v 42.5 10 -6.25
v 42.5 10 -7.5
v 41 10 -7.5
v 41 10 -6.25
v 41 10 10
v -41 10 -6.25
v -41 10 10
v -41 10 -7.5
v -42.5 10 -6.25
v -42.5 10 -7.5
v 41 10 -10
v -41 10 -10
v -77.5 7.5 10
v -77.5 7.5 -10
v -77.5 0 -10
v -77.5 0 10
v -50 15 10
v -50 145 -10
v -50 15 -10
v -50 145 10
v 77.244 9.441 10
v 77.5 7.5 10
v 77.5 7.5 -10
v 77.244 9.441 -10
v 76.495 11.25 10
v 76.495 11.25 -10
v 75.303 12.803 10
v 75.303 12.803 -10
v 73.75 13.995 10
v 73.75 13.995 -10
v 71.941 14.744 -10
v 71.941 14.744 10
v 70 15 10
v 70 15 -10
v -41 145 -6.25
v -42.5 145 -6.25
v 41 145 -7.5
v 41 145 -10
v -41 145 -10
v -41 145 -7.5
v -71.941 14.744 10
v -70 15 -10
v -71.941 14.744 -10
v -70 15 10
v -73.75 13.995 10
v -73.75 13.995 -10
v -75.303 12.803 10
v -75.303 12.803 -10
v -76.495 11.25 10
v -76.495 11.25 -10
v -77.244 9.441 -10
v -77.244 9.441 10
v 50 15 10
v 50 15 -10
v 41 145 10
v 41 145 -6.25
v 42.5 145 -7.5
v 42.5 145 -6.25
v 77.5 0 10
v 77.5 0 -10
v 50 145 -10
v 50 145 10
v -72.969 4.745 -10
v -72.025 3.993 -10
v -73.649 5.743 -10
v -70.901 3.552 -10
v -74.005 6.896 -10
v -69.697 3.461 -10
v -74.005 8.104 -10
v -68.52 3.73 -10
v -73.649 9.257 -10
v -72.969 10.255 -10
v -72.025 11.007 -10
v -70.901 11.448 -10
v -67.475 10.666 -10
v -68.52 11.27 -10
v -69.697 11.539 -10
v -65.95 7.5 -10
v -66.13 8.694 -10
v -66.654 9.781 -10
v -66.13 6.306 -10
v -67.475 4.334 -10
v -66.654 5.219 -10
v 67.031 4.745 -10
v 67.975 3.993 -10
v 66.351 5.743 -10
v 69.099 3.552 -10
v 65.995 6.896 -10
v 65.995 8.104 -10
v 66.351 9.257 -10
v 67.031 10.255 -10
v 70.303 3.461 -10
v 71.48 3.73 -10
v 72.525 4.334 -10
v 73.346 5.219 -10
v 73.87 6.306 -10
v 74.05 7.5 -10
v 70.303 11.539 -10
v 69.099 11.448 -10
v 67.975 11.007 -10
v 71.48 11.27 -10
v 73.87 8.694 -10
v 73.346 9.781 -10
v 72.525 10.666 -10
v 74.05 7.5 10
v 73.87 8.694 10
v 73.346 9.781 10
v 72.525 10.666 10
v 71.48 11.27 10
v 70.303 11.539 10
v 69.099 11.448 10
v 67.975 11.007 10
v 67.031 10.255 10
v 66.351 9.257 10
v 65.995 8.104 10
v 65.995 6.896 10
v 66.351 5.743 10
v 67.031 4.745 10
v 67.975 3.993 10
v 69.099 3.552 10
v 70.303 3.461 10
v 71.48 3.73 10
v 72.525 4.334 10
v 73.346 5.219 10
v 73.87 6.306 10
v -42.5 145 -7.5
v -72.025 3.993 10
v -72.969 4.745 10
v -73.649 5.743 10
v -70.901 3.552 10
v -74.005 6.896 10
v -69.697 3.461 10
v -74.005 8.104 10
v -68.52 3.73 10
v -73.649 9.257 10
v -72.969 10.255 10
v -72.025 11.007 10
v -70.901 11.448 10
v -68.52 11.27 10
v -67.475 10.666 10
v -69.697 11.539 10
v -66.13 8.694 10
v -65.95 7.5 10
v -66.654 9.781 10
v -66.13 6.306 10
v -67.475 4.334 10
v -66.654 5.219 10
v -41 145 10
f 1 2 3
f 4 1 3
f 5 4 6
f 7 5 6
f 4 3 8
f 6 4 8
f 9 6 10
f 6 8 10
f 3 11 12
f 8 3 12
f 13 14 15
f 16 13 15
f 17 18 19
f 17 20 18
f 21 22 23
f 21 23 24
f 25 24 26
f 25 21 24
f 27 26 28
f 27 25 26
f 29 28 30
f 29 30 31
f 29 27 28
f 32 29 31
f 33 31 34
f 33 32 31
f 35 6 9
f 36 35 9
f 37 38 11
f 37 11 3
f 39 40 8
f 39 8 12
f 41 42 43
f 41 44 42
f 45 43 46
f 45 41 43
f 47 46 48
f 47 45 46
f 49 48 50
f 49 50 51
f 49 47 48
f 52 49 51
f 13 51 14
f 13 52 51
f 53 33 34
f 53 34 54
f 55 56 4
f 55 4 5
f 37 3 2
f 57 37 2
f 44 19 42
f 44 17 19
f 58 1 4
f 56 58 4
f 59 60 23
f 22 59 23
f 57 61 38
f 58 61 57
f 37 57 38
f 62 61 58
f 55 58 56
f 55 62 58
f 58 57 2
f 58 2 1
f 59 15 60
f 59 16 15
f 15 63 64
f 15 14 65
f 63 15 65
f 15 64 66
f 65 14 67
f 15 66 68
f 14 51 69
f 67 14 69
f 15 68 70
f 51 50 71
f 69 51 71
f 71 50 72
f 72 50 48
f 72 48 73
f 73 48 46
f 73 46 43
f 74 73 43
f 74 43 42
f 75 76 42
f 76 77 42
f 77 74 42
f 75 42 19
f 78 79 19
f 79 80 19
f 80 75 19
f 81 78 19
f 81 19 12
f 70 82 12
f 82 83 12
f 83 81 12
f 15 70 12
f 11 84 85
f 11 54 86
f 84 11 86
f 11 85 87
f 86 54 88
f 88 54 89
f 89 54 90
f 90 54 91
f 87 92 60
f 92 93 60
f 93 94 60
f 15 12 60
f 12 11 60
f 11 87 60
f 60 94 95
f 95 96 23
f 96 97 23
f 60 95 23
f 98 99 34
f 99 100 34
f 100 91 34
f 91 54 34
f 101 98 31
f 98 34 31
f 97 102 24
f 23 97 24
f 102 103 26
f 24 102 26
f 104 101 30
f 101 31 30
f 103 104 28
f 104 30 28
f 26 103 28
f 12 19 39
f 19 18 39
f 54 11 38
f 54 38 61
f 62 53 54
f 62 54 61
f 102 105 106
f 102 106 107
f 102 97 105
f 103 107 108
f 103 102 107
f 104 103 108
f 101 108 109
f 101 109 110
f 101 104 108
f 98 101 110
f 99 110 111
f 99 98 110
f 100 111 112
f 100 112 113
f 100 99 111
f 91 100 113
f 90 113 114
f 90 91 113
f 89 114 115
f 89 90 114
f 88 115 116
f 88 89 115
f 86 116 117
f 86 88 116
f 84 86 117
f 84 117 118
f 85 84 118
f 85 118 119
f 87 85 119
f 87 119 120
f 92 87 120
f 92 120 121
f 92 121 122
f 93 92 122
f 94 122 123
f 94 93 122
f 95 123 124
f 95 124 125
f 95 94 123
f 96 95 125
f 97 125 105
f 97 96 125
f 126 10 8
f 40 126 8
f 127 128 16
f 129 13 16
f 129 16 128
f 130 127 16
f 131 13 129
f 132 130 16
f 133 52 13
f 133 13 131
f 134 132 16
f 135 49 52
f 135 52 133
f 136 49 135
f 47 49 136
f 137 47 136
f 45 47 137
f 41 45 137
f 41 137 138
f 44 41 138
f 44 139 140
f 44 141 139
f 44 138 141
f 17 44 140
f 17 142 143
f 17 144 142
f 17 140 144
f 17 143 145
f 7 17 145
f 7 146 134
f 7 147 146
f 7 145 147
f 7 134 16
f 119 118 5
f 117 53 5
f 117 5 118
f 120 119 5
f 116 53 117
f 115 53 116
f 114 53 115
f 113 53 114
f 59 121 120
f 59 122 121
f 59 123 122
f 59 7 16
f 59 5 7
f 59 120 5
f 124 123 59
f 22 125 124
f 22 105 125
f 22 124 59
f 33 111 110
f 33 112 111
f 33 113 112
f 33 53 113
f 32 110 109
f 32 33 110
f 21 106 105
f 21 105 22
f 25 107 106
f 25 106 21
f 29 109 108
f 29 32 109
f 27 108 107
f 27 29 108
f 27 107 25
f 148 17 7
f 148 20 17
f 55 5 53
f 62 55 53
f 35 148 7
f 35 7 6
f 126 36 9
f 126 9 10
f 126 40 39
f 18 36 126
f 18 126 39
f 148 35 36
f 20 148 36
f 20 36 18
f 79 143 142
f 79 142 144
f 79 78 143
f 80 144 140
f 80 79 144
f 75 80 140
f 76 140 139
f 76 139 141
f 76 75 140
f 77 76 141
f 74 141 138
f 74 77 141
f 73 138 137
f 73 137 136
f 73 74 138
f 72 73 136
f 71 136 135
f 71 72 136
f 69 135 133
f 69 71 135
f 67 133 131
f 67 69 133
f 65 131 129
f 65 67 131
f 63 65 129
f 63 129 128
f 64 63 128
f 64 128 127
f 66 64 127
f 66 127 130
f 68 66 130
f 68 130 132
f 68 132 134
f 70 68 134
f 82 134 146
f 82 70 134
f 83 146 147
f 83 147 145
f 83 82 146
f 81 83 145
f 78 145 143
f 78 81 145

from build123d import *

# Parameters (mm, degrees)
SKETCH1_R           = 4.05
BOSS_EXTRUDE1_DEPTH = 10
CUT_EXTRUDE1_DEPTH  = 135


with BuildPart() as part:
    # Sketch1 → Boss-Extrude1 (new, symmetric)
    with BuildSketch(Plane.XY):
        with BuildLine():
            Line((-77.5, 0), (77.5, 0))
            Line((77.5, 0), (77.5, 7.5))
            ThreePointArc((77.5, 7.5), (75.303300859, 12.803300859), (70, 15))
            Line((70, 15), (50, 15))
            Line((50, 15), (50, 145))
            Line((50, 145), (-50, 145))
            Line((-50, 145), (-50, 15))
            Line((-50, 15), (-70, 15))
            ThreePointArc((-70, 15), (-75.303300859, 12.803300859), (-77.5, 7.5))
            Line((-77.5, 7.5), (-77.5, 0))
        make_face()
        with Locations((-70, 7.5)):
            Circle(SKETCH1_R, mode=Mode.SUBTRACT)
        with Locations((70, 7.5)):
            Circle(SKETCH1_R, mode=Mode.SUBTRACT)
    extrude(amount=BOSS_EXTRUDE1_DEPTH, both=True)

    # Sketch2 → Cut-Extrude1 (cut)
    with BuildSketch(Plane(origin=(0, 145, 0), x_dir=(1, 0, 0), z_dir=(0, 1, 0))):
        Polygon((-41, -10), (-41, 6.25), (-42.5, 6.25), (-42.5, 7.5), (-41, 7.5), (-41, 10), (41, 10), (41, 7.5), (42.5, 7.5), (42.5, 6.25), (41, 6.25), (41, -10), align=None)
    extrude(amount=-CUT_EXTRUDE1_DEPTH, mode=Mode.SUBTRACT)


solid = part.part
